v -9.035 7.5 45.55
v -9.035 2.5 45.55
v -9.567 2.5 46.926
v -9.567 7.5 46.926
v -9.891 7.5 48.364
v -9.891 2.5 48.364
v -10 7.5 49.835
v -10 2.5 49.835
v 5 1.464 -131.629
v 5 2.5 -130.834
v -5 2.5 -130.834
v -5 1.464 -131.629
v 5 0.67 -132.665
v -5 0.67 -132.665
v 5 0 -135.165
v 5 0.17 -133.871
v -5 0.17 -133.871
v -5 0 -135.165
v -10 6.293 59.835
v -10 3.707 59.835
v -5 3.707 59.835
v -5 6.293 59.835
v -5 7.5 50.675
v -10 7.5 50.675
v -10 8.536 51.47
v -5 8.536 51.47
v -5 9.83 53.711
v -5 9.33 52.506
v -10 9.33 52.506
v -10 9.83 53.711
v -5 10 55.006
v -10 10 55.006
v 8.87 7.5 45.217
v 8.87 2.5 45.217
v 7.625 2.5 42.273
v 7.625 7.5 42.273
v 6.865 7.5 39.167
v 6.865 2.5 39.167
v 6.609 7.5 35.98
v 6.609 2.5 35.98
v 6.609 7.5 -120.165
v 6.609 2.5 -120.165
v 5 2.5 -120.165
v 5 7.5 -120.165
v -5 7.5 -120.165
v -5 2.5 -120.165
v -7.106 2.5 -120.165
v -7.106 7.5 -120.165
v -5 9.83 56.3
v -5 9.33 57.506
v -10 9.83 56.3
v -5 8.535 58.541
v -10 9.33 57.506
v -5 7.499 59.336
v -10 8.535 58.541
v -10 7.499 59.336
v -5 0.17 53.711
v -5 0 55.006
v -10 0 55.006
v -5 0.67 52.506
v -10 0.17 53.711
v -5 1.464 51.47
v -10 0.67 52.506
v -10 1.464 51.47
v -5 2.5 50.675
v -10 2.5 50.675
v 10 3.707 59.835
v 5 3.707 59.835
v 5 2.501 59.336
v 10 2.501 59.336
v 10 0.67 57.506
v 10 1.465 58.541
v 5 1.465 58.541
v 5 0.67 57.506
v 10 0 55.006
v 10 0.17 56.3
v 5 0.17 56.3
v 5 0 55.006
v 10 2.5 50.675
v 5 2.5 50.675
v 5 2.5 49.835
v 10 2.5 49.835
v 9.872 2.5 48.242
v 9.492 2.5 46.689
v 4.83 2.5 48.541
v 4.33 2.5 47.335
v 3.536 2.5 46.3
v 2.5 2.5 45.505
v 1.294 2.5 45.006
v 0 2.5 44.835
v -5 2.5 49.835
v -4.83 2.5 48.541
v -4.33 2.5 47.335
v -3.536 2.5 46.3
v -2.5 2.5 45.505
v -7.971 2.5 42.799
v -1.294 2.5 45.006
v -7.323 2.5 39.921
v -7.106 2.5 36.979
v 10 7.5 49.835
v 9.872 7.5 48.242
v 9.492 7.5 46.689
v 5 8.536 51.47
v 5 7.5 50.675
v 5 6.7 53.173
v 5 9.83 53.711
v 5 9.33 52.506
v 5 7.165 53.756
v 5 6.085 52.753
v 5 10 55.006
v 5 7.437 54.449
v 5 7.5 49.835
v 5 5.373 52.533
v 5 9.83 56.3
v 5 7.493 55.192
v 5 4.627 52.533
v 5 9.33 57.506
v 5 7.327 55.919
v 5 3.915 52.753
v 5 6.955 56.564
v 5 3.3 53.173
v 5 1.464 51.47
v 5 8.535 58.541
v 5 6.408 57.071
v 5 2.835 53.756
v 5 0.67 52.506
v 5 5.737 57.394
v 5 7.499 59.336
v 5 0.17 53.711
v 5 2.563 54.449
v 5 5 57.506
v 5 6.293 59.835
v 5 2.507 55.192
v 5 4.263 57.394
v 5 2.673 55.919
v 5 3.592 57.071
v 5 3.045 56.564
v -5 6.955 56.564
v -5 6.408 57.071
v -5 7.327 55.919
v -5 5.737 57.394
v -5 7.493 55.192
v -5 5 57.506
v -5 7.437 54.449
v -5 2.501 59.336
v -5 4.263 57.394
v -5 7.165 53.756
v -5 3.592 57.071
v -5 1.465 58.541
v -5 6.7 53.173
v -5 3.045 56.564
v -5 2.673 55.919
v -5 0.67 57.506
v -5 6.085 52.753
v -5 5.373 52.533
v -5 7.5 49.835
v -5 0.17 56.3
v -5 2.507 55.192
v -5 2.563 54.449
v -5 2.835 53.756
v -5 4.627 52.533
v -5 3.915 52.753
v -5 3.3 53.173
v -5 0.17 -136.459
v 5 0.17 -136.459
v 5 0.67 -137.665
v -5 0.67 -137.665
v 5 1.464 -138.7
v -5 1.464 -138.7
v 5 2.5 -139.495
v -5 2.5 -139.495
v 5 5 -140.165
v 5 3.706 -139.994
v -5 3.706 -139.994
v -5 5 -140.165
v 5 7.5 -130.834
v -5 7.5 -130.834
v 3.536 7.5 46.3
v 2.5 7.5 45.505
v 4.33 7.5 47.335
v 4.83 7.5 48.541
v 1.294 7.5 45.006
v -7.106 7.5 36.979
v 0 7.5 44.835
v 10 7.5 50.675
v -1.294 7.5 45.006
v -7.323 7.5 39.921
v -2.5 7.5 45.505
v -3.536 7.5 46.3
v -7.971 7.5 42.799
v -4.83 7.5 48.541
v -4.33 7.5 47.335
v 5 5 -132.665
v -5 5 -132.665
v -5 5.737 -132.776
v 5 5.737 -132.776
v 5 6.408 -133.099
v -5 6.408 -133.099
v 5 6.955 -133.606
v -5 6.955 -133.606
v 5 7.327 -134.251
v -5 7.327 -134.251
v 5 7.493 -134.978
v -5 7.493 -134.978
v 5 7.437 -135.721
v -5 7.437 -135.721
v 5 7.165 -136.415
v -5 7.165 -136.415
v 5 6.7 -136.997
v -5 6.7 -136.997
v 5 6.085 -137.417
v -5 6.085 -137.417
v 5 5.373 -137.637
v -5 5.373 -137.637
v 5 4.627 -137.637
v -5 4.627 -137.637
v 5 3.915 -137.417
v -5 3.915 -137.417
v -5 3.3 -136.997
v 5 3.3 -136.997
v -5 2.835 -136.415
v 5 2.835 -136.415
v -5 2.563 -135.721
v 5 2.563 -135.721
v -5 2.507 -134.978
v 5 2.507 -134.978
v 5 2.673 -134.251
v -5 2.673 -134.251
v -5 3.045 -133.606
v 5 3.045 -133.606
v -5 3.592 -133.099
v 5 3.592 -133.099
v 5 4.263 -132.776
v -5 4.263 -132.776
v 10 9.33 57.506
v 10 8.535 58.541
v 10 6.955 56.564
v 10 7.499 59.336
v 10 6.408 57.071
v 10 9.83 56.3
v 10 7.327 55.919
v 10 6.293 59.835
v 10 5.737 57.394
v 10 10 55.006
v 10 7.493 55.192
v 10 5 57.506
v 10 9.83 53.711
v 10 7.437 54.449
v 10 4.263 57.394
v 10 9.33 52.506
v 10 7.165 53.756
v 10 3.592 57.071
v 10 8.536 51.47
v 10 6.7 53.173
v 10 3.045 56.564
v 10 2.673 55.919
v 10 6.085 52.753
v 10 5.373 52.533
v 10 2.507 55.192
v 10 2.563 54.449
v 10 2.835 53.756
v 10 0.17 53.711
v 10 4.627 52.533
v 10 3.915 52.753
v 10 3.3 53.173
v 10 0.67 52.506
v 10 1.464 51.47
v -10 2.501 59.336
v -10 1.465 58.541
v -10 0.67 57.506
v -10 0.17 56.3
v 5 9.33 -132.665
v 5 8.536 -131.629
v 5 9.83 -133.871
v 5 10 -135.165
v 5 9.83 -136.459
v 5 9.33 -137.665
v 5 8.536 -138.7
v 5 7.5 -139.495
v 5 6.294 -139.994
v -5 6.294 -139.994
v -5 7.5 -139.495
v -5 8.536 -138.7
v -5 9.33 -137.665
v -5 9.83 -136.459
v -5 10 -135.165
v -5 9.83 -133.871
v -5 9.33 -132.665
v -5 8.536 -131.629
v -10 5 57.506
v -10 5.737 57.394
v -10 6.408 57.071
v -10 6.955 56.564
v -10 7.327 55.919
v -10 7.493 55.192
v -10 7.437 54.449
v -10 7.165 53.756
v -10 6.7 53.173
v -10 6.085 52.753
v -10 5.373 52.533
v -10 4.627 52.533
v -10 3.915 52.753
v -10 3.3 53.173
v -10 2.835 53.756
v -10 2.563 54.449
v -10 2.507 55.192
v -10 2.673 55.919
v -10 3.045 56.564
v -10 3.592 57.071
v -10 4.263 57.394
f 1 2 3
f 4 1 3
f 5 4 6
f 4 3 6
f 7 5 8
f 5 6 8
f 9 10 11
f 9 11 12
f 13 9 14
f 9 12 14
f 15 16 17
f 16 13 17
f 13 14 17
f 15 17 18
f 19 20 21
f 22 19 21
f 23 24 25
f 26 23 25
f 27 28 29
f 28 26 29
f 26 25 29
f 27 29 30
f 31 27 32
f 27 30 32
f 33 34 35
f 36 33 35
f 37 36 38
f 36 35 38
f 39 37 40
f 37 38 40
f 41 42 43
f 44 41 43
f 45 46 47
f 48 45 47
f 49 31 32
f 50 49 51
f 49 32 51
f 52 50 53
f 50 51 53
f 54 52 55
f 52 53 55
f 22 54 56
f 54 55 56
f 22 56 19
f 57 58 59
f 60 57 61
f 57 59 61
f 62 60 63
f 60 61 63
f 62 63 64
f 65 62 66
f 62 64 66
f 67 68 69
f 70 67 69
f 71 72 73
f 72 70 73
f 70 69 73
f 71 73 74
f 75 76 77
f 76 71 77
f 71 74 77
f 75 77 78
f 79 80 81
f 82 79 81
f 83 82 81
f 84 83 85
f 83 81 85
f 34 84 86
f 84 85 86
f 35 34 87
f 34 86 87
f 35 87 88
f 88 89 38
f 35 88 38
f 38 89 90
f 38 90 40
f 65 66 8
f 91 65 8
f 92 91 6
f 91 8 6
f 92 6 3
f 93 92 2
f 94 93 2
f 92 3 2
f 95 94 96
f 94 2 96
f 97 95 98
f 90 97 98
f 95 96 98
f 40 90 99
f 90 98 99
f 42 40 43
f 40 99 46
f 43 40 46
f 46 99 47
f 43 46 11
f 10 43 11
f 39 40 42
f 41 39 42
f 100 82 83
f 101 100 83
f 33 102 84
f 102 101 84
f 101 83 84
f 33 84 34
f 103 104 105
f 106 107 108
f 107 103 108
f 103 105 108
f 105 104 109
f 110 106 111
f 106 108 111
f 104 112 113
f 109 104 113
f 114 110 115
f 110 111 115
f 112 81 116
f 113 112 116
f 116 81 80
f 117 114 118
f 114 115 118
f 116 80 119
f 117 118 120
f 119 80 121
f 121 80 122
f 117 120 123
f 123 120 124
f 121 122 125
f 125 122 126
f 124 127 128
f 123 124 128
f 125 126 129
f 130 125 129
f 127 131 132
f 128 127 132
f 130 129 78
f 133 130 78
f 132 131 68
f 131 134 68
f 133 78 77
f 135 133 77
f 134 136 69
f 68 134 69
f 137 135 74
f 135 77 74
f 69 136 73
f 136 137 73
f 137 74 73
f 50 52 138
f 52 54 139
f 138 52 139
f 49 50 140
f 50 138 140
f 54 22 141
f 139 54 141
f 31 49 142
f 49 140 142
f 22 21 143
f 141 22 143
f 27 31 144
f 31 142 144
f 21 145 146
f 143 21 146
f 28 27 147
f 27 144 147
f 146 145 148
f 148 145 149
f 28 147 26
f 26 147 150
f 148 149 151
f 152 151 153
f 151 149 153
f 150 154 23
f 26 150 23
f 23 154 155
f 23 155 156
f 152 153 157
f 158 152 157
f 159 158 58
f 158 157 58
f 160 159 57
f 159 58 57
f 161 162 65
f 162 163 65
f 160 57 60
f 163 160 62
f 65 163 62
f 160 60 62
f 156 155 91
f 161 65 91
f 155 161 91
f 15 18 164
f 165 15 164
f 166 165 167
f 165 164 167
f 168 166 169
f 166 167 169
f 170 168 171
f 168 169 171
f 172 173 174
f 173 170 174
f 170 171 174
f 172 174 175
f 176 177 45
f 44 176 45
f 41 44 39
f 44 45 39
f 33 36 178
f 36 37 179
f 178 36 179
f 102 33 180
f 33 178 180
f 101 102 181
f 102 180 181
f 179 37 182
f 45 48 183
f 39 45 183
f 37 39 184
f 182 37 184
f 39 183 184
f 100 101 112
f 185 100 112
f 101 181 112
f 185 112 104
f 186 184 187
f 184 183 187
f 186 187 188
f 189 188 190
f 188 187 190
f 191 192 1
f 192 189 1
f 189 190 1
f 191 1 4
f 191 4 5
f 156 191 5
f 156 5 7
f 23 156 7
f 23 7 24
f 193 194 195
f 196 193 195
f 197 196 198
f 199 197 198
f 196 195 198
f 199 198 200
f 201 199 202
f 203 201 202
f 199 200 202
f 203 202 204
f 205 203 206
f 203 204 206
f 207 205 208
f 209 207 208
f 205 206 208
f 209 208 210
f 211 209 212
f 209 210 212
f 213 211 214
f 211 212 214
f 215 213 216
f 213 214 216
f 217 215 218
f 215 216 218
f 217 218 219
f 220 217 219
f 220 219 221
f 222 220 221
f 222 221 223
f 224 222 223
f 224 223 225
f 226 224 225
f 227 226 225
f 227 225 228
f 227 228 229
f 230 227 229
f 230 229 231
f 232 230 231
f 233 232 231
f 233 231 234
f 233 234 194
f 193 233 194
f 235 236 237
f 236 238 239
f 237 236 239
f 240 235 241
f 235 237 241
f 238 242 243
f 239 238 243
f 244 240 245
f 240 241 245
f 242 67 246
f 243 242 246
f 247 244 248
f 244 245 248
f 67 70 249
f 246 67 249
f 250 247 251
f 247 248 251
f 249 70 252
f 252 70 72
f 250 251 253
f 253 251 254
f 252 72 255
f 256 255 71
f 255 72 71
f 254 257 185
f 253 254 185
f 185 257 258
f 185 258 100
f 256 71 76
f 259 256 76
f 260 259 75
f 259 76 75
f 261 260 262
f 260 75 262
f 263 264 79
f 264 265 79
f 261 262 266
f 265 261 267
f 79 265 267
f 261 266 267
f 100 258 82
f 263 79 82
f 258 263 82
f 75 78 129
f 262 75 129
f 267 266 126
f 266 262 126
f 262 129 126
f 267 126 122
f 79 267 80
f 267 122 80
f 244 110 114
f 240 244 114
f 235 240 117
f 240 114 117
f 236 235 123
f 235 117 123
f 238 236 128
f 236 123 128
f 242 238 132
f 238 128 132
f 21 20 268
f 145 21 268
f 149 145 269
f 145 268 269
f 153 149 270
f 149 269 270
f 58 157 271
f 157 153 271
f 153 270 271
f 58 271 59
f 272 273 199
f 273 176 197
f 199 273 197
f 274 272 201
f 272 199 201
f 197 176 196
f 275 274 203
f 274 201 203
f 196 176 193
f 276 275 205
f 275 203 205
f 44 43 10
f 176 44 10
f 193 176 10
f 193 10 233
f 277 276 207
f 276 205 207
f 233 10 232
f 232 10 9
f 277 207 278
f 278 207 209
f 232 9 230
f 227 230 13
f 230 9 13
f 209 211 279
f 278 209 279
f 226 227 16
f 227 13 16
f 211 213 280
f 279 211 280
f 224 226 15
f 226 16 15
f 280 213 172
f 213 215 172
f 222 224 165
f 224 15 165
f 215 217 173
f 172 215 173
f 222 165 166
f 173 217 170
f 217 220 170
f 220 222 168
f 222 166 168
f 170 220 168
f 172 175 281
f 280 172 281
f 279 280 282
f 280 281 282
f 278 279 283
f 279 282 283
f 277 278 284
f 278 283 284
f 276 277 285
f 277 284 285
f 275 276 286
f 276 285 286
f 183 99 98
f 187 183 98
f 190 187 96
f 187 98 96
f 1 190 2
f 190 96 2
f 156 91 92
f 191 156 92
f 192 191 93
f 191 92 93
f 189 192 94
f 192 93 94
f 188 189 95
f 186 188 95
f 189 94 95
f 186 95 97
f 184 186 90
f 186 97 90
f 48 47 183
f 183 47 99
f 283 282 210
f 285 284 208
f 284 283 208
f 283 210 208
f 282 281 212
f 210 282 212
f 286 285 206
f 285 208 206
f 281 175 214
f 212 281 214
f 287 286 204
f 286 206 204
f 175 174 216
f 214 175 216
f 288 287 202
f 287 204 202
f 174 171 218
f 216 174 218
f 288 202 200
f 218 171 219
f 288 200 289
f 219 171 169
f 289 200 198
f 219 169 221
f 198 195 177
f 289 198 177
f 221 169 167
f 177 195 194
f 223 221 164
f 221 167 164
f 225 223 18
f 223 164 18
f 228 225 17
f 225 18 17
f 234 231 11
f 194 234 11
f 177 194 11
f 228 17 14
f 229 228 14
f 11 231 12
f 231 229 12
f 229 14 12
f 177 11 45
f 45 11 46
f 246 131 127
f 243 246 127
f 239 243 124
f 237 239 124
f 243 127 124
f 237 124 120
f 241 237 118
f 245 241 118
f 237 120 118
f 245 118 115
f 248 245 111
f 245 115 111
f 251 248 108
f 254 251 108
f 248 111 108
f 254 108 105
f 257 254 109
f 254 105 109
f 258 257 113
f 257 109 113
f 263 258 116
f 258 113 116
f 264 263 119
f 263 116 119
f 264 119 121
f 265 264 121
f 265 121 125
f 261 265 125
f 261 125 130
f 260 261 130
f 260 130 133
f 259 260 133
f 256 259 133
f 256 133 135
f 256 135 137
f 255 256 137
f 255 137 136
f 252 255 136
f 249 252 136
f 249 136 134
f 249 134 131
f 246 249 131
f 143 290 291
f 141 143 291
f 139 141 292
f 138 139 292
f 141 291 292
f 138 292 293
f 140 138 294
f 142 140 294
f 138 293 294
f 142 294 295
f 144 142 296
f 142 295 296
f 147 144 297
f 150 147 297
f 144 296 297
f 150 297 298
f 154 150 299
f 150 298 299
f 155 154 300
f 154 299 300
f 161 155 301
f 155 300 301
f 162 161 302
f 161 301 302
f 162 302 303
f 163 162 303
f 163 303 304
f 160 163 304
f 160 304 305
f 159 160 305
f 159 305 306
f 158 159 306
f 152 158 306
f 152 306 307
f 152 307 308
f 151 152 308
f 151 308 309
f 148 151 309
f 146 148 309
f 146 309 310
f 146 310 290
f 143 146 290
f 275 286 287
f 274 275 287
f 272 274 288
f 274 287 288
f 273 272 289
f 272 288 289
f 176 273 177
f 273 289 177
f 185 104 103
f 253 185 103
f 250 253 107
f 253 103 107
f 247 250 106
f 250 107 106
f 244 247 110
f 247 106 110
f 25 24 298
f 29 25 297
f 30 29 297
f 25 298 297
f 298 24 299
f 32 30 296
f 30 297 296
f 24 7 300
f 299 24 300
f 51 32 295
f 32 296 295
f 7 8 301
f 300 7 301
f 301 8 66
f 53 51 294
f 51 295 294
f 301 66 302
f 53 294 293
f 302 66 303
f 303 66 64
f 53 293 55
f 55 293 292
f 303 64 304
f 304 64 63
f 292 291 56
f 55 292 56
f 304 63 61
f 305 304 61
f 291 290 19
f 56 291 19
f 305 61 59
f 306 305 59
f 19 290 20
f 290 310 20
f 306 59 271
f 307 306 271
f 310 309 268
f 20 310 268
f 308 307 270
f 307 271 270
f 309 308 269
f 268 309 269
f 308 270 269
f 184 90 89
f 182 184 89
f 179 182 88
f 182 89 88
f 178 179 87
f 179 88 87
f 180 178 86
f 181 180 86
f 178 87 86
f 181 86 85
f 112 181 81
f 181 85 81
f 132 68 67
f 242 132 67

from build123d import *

# Parameters (mm, degrees)
BOSS_EXTRUDE2_DEPTH = 10
SKETCH7_R           = 2.5
CUT_EXTRUDE1_DEPTH  = 142.937027035


with BuildPart() as part:
    # Sketch3 → Boss-Extrude2 (new body)
    with BuildSketch(Plane(origin=(0, 0, 0), x_dir=(1, 0, 0), z_dir=(0, 1, 0))):
        with BuildLine():
            ThreePointArc((-5, -49.835383767), (-3.535533906, -46.299849861), (0, -44.835383767))
            ThreePointArc((0, -44.835383767), (3.535533906, -46.299849861), (5, -49.835383767))
            Line((5, -49.835383767), (5, -59.835383767))
            Line((5, -59.835383767), (10, -59.835383767))
            Line((10, -59.835383767), (10, -49.835383767))
            ThreePointArc((10, -49.835383767), (9.713312199, -47.45808149), (8.869686776, -45.217087925))
            ThreePointArc((8.869686776, -45.217087925), (7.18243593, -40.735100795), (6.609060329, -35.98049624))
            Line((6.609060329, -35.98049624), (6.609060329, 120.164616233))
            Line((6.609060329, 120.164616233), (5, 120.164616233))
            Line((5, 120.164616233), (5, 140.164616233))
            Line((5, 140.164616233), (-5, 140.164616233))
            Line((-5, 140.164616233), (-5, 120.164616233))
            Line((-5, 120.164616233), (-7.105716065, 120.164616233))
            Line((-7.105716065, 120.164616233), (-7.105716065, -36.979250733))
            ThreePointArc((-7.105716065, -36.979250733), (-7.594058684, -41.37188391), (-9.035238688, -45.550006089))
            ThreePointArc((-9.035238688, -45.550006089), (-9.755828695, -47.6390672), (-10, -49.835383811))
            Line((-10, -49.835383811), (-10, -59.835383767))
            Line((-10, -59.835383767), (-5, -59.835383767))
            Line((-5, -59.835383767), (-5, -49.835383767))
        make_face()
    extrude(amount=BOSS_EXTRUDE2_DEPTH)

    # Sketch7 → Cut-Extrude1 (cut, through all)
    with BuildSketch(Plane.ZY.offset(10)):
        with BuildLine():
            ThreePointArc((-140.164616233, 5), (-138.700150139, 8.535533906), (-135.164616233, 10))
            Line((-135.164616233, 10), (-140.164616233, 10))
            Line((-140.164616233, 10), (-140.164616233, 5))
        make_face()
        with BuildLine():
            ThreePointArc((-135.164616202, 0), (-138.700150128, 1.464466083), (-140.164616233, 5))
            Line((-140.164616233, 5), (-140.164616233, 0))
            Line((-140.164616233, 0), (-135.164616202, 0))
        make_face()
        with BuildLine():
            ThreePointArc((-135.164616233, 10), (-132.664616233, 9.330127019), (-130.834489214, 7.5))
            Line((-130.834489214, 7.5), (-120.164616233, 7.5))
            Line((-120.164616233, 7.5), (-120.164616233, 10))
            Line((-120.164616233, 10), (-135.164616233, 10))
        make_face()
        with BuildLine():
            Line((-120.164616233, 0), (-120.164616233, 2.5))
            Line((-120.164616233, 2.5), (-130.834489214, 2.5))
            ThreePointArc((-130.834489214, 2.5), (-132.664616219, 0.669872989), (-135.164616202, 0))
            Line((-135.164616202, 0), (-120.164616233, 0))
        make_face()
        Polygon((49.835383767, 2.5), (-120.164616233, 2.5), (-120.164616233, 0), (36.979250733, 0), (45.550006089, 0), (49.835383767, 0), align=None)
        Polygon((-120.164616233, 10), (-120.164616233, 7.5), (49.835383767, 7.5), (49.835383767, 10), (45.550006089, 10), (36.979250733, 10), align=None)
        with BuildLine():
            Line((49.835383767, 10), (49.835383767, 7.5))
            Line((49.835383767, 7.5), (50.675374481, 7.5))
            ThreePointArc((50.675374481, 7.5), (52.5055015, 9.330127019), (55.0055015, 10))
            Line((55.0055015, 10), (49.835383767, 10))
        make_face()
        with BuildLine():
            Line((59.835383767, 10), (55.0055015, 10))
            ThreePointArc((55.0055015, 10), (58.049696739, 8.966468877), (59.835383767, 6.293150141))
            Line((59.835383767, 6.293150141), (59.835383767, 10))
        make_face()
        with BuildLine():
            ThreePointArc((59.835383767, 3.706849859), (58.049696739, 1.033531123), (55.0055015, 0))
            Line((55.0055015, 0), (59.835383767, 0))
            Line((59.835383767, 0), (59.835383767, 3.706849859))
        make_face()
        with BuildLine():
            Line((50.675374481, 2.5), (49.835383767, 2.5))
            Line((49.835383767, 2.5), (49.835383767, 0))
            Line((49.835383767, 0), (55.0055015, 0))
            ThreePointArc((55.0055015, 0), (52.5055015, 0.669872981), (50.675374481, 2.5))
        make_face()
        with Locations((55.0055015, 5)):
            Circle(SKETCH7_R)
        with Locations((-135.164616233, 5)):
            Circle(SKETCH7_R)
    extrude(amount=-CUT_EXTRUDE1_DEPTH, mode=Mode.SUBTRACT)


solid = part.part
